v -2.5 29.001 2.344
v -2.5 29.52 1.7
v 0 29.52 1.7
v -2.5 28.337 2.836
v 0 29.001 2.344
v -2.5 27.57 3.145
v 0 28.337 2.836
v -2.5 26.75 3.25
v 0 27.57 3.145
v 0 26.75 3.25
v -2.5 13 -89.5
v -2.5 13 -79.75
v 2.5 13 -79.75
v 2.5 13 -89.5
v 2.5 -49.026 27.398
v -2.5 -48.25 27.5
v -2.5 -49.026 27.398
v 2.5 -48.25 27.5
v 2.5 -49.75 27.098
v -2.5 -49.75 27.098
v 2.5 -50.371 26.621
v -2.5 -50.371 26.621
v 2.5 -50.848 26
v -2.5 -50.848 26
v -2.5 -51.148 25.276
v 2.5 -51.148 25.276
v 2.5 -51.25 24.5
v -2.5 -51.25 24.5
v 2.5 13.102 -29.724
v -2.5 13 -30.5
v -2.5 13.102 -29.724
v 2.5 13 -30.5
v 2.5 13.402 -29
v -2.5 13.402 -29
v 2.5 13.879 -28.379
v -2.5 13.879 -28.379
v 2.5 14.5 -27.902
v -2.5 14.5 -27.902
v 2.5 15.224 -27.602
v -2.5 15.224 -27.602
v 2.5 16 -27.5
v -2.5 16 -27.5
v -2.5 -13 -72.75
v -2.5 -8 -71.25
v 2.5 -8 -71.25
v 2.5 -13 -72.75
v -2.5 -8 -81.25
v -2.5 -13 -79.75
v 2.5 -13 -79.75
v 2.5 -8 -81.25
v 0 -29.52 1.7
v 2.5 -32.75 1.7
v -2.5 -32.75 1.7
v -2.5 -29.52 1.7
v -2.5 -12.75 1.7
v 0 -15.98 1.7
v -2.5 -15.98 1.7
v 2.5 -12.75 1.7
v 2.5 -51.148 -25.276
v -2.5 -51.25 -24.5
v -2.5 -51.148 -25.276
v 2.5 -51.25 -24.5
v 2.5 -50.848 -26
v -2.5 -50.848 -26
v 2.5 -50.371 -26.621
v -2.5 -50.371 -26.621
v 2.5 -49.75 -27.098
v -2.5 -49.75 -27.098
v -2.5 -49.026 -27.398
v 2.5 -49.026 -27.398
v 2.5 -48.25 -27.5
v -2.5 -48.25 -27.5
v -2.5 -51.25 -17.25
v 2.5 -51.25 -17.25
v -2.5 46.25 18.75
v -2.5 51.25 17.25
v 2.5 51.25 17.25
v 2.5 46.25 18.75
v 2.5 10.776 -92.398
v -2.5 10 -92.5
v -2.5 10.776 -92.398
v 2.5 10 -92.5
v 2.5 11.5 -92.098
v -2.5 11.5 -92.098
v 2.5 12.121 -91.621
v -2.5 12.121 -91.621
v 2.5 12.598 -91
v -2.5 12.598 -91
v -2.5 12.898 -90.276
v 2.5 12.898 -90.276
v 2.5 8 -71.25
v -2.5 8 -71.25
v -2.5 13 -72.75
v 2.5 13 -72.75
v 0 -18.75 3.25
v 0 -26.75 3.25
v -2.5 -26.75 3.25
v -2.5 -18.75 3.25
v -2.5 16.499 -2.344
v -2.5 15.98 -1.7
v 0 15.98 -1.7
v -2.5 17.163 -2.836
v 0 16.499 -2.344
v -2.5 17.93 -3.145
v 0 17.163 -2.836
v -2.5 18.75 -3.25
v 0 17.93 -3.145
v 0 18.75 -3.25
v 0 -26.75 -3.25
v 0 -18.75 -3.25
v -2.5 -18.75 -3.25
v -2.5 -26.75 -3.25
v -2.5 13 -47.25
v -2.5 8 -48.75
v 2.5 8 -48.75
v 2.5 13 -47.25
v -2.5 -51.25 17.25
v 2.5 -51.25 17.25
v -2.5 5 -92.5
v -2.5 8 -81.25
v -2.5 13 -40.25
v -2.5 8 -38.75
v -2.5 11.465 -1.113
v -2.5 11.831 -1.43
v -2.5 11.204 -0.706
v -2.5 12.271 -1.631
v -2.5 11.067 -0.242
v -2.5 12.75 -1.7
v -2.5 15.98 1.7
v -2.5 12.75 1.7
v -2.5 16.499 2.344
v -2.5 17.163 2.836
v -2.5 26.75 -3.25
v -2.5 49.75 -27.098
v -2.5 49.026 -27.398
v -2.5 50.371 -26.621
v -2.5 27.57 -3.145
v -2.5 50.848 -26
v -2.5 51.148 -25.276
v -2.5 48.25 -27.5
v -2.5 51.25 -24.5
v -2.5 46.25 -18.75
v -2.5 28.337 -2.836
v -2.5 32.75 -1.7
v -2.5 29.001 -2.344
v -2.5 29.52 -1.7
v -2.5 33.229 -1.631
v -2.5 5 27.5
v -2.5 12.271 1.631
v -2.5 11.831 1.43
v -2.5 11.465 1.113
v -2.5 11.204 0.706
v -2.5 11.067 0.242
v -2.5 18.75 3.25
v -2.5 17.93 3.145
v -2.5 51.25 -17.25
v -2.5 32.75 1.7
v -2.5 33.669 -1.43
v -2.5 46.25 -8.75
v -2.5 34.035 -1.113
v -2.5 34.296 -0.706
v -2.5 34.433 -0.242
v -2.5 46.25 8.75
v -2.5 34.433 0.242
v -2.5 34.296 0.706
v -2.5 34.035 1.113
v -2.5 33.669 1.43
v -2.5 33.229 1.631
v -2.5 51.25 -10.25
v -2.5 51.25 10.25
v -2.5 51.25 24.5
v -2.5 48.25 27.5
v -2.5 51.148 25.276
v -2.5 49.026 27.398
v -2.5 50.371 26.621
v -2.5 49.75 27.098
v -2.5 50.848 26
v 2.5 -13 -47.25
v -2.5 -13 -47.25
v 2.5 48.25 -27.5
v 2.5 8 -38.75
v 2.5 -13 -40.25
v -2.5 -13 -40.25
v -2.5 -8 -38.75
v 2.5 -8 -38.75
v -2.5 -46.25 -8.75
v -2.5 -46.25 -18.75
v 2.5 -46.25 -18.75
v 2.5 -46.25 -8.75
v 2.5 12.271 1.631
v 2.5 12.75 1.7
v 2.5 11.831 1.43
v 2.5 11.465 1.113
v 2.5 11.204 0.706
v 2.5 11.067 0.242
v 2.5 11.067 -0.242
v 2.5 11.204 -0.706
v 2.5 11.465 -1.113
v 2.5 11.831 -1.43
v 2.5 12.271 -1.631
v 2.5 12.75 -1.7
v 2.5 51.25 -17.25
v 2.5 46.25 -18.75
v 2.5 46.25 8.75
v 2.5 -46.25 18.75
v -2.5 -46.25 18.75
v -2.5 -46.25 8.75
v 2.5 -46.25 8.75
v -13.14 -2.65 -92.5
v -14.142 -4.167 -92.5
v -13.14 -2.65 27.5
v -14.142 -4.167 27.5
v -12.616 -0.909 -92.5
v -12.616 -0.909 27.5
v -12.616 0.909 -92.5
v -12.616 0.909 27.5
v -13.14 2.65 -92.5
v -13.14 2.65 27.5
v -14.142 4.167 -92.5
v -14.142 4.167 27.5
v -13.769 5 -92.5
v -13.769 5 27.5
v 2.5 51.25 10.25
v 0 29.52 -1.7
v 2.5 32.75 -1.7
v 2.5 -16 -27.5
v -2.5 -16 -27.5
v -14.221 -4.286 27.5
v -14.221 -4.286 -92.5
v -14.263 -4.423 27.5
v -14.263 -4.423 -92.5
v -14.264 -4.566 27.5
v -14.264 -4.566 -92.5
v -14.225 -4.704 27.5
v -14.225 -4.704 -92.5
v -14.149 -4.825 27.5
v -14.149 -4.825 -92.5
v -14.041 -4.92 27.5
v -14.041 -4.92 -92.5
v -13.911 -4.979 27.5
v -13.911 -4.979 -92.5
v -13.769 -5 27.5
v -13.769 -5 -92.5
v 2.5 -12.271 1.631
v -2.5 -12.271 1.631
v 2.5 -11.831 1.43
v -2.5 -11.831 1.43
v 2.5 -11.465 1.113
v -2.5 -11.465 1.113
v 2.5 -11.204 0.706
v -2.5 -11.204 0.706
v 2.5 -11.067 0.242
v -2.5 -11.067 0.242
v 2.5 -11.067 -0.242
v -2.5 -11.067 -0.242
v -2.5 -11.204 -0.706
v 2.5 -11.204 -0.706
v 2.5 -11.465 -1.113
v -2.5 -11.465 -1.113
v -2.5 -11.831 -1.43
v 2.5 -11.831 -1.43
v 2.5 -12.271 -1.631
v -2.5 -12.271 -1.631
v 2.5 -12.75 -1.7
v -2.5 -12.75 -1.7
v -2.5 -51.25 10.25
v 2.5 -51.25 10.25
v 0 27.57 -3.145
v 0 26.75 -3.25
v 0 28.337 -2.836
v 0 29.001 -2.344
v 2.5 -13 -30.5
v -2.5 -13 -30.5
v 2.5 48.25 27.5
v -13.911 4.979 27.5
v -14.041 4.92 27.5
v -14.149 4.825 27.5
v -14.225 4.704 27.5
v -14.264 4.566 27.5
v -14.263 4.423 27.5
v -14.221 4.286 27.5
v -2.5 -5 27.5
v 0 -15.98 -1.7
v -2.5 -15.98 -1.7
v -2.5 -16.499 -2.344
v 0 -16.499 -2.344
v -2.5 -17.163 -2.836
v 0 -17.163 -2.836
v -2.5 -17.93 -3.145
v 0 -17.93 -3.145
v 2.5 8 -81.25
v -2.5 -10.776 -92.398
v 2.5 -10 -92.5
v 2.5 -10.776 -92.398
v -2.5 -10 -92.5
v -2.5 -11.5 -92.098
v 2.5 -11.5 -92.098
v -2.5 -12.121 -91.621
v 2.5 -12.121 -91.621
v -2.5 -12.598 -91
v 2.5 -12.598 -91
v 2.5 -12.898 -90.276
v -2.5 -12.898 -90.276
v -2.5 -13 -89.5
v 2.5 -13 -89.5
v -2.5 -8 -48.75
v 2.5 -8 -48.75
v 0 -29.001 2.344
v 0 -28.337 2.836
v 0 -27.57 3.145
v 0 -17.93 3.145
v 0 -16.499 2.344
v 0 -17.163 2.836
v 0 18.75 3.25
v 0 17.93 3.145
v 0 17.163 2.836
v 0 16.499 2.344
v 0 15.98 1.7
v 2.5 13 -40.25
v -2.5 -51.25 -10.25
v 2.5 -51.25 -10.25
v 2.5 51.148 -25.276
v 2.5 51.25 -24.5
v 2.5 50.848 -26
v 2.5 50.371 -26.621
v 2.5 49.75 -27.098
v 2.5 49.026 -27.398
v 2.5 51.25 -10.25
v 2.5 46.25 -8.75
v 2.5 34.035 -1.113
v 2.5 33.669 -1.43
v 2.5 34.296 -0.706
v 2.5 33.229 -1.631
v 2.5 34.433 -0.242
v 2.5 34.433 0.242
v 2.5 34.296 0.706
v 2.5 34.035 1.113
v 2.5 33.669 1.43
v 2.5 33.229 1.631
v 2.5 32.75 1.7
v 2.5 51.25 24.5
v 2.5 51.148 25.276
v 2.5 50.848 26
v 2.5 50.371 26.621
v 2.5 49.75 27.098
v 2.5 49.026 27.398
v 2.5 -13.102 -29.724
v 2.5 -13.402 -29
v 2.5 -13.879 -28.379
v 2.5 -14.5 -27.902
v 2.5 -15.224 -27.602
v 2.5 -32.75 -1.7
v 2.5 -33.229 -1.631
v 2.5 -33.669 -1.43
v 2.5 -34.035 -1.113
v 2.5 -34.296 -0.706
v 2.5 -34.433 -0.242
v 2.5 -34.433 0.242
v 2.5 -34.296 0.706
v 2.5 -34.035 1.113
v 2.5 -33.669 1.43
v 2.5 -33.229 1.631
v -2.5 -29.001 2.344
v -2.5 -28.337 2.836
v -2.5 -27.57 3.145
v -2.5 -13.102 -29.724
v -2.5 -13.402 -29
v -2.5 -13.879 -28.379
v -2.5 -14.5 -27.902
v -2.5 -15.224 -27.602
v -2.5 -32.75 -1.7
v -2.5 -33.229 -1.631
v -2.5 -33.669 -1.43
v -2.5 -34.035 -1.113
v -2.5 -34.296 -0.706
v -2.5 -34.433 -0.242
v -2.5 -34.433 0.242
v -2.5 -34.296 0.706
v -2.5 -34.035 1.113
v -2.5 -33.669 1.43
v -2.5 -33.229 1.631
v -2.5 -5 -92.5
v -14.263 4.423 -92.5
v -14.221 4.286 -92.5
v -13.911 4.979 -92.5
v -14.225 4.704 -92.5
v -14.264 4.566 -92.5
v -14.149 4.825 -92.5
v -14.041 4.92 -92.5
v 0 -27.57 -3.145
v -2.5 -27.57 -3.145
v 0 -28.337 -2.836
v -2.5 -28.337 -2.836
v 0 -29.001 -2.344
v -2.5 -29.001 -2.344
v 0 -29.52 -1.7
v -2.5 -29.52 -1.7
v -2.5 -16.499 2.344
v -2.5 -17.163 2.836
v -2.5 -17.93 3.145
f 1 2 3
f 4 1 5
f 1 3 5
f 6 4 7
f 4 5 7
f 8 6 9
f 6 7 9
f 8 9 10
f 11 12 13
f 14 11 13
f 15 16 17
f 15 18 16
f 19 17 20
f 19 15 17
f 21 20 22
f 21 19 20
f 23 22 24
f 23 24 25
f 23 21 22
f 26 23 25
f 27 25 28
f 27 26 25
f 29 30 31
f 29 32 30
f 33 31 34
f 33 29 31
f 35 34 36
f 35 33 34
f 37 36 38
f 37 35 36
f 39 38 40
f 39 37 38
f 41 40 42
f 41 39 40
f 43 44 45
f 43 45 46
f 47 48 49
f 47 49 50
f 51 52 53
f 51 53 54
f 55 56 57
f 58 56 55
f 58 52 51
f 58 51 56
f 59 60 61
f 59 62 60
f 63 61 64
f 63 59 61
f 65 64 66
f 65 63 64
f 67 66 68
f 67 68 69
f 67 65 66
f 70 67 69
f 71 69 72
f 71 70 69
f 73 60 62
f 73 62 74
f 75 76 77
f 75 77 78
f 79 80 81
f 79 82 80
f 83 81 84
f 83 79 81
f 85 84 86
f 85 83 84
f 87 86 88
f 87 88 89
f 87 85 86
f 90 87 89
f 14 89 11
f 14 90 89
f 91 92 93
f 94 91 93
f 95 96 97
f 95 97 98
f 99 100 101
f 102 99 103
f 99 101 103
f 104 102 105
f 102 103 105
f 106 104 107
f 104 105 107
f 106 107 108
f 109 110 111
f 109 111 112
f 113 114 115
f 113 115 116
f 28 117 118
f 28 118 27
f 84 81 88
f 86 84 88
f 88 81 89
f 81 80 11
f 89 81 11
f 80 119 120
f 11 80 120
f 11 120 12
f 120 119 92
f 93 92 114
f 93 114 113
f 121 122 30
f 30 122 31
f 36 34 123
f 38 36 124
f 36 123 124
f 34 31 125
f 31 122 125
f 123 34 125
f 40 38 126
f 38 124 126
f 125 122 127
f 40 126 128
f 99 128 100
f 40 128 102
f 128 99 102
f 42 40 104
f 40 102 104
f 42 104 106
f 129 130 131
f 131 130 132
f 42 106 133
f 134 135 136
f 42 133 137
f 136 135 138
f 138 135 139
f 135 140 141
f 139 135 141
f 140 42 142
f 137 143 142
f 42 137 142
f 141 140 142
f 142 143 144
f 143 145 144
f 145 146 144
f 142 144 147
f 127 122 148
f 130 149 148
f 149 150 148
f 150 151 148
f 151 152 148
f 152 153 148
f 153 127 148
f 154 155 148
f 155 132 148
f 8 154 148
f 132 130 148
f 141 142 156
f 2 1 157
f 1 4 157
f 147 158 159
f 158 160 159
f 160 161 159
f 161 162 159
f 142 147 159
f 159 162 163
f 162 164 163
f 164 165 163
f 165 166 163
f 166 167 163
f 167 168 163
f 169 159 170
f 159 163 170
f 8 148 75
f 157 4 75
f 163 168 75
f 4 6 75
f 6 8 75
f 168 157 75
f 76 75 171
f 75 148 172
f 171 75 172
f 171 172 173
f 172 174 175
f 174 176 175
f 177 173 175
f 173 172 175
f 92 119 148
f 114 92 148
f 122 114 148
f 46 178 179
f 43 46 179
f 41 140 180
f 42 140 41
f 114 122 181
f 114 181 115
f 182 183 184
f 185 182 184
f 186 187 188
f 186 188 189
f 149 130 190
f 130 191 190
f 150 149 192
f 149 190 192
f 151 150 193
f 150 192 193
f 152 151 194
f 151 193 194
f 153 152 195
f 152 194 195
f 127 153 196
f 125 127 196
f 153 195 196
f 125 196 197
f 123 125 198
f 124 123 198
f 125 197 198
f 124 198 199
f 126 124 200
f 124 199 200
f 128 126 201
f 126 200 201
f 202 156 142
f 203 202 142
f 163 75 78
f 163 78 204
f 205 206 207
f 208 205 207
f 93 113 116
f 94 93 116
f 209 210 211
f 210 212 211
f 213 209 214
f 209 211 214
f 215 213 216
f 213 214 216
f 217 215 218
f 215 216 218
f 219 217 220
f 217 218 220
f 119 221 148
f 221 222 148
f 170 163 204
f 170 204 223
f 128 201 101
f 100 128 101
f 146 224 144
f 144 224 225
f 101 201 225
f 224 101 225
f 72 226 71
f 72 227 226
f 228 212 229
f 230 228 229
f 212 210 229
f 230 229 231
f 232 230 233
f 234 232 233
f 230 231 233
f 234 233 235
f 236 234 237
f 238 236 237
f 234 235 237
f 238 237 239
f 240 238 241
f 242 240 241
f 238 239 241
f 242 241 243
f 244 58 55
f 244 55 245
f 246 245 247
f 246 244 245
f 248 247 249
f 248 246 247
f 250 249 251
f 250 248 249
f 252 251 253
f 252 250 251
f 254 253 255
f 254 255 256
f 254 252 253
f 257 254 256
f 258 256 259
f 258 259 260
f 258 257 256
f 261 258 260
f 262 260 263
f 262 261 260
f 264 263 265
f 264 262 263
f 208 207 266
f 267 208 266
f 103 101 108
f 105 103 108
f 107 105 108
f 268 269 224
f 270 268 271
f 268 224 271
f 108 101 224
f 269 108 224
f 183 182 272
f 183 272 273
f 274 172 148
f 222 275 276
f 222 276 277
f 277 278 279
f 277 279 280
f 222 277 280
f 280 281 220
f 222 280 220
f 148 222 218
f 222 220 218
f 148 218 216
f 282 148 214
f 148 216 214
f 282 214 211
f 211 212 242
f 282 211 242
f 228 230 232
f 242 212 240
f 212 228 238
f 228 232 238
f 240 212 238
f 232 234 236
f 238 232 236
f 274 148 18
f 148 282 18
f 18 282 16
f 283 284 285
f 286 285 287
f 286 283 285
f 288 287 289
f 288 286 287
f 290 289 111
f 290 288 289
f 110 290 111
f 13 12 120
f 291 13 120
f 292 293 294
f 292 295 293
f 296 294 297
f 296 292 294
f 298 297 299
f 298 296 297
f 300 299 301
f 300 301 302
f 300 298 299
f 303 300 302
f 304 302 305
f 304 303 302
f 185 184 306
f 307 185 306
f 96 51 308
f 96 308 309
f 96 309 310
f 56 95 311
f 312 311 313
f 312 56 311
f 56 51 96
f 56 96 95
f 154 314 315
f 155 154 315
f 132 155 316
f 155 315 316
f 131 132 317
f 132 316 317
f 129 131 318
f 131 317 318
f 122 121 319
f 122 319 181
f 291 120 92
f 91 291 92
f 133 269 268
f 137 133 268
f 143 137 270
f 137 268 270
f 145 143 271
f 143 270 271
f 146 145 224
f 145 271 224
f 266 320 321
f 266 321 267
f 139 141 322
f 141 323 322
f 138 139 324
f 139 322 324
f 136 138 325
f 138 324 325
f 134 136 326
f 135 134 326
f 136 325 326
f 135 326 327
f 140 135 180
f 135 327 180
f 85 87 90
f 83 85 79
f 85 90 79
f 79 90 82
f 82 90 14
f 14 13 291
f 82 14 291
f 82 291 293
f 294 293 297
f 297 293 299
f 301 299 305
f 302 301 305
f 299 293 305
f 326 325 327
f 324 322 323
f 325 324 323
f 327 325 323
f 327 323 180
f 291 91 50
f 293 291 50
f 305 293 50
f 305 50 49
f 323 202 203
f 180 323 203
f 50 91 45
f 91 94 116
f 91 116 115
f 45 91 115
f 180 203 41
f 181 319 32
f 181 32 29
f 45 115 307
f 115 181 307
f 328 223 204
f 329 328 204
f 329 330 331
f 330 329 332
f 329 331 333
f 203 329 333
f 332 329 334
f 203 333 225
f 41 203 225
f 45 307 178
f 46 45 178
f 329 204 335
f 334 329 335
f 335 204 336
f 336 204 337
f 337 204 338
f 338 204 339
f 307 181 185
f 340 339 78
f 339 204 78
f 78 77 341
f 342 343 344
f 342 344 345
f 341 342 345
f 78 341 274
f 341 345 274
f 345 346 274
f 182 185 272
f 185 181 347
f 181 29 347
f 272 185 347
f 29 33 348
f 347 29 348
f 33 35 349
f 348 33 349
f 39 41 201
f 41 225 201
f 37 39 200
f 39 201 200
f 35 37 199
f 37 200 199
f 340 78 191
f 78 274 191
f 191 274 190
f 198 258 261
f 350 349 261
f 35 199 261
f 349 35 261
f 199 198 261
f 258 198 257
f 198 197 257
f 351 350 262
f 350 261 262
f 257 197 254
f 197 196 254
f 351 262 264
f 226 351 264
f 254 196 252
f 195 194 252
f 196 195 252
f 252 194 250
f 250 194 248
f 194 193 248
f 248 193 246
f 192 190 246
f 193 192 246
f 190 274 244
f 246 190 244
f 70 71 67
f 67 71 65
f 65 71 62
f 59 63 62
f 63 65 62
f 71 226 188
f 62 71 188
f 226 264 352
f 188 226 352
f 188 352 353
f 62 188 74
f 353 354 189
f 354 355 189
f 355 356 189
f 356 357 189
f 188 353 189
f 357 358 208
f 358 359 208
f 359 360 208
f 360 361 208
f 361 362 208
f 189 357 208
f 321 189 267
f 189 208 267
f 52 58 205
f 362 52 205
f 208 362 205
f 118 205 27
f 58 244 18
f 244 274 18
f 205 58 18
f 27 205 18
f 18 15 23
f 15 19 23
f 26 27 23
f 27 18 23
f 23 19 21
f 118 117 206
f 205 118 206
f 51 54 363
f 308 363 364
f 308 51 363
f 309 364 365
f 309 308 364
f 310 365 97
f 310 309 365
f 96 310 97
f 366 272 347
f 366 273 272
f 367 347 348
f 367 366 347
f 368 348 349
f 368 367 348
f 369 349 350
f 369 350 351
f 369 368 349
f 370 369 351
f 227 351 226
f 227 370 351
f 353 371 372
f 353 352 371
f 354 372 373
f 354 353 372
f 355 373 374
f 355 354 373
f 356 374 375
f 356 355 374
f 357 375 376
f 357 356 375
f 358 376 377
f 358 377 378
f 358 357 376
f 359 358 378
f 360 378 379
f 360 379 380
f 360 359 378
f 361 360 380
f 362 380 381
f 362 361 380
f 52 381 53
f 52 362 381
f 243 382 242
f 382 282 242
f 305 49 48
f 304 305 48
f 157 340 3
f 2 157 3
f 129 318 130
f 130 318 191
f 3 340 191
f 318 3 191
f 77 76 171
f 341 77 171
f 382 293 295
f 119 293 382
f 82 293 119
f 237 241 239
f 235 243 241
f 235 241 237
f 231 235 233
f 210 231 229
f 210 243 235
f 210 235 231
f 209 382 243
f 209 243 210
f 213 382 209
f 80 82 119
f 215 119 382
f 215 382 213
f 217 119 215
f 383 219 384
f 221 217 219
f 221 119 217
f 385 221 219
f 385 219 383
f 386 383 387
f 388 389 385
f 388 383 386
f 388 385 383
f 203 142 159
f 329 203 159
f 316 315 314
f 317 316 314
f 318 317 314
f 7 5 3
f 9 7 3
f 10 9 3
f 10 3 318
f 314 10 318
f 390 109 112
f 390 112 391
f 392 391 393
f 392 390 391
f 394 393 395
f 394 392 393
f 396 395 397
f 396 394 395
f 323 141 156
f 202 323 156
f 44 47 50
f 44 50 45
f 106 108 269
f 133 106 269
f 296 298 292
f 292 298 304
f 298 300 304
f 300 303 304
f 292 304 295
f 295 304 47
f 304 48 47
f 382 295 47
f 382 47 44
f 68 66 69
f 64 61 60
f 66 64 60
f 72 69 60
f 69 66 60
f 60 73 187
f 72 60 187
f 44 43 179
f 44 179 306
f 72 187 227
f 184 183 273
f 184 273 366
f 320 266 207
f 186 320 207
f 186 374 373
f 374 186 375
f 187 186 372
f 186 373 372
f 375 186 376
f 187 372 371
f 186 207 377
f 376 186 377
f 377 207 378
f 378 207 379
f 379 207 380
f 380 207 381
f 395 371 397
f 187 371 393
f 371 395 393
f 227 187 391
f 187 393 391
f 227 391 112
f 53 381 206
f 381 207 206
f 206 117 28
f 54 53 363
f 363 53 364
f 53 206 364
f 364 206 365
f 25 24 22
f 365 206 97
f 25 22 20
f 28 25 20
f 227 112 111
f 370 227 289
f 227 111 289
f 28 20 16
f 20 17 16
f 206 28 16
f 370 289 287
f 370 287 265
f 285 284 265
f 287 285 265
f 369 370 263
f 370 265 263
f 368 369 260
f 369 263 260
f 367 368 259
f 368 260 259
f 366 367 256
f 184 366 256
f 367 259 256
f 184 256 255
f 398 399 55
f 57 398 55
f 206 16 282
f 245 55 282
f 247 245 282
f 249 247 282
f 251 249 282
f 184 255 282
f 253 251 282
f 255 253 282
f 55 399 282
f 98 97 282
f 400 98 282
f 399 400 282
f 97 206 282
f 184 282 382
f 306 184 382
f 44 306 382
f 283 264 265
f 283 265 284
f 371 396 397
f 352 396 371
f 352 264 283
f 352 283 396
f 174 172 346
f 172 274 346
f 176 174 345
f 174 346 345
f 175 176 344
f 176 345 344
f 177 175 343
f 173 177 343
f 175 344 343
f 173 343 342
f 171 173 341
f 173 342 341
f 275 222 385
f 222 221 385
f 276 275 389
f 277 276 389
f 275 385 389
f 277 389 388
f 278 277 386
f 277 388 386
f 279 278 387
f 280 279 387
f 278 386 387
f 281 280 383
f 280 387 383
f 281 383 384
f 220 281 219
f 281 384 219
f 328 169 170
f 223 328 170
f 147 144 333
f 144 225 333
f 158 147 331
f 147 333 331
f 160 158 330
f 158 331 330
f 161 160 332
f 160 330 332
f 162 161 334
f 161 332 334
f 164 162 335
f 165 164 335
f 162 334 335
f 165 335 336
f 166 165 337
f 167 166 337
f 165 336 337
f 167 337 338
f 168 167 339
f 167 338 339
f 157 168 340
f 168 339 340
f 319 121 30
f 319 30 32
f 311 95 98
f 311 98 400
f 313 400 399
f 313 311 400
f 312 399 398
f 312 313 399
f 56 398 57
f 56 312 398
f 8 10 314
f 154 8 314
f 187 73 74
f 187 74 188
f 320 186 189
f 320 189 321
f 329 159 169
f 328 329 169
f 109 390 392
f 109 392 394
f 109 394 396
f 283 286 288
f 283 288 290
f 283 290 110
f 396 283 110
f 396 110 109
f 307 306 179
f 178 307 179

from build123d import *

# Parameters (mm, degrees)
SKETCH1_W           = 55
SKETCH1_H           = 78.5
BOSS_EXTRUDE1_DEPTH = 2.5
SKETCH6_W           = 55
SKETCH6_H           = 10
BOSS_EXTRUDE2_DEPTH = 16.3
CUT_EXTRUDE1_DEPTH  = 71.135600803
SKETCH9_W           = 55
SKETCH9_H           = 12
BOSS_EXTRUDE3_DEPTH = 5
CUT_EXTRUDE4_DEPTH  = 5
CUT_EXTRUDE2_DEPTH  = 2.5
BOSS_EXTRUDE4_DEPTH = 65
FILLET1_R           = 0.5
CUT_EXTRUDE3_DEPTH  = 5
FILLET2_R           = 3


with BuildPart() as part:
    # Sketch1 → Boss-Extrude1 (new, symmetric)
    with BuildSketch(Plane(origin=(0, 0, 0), x_dir=(0, 0, -1), z_dir=(1, 0, 0))):
        Rectangle(SKETCH1_W, SKETCH1_H)
        with BuildLine():
            Line((-1.7, -32.75), (-1.7, -12.75))
            ThreePointArc((-1.7, -12.75), (0, -11.05), (1.7, -12.75))
            Line((1.7, -12.75), (1.7, -32.75))
            ThreePointArc((1.7, -32.75), (0, -34.45), (-1.7, -32.75))
        make_face(mode=Mode.SUBTRACT)
        with BuildLine():
            Line((-1.7, 32.75), (-1.7, 12.75))
            ThreePointArc((-1.7, 12.75), (0, 11.05), (1.7, 12.75))
            Line((1.7, 12.75), (1.7, 32.75))
            ThreePointArc((1.7, 32.75), (0, 34.45), (-1.7, 32.75))
        make_face(mode=Mode.SUBTRACT)
    extrude(amount=BOSS_EXTRUDE1_DEPTH, both=True)

    # Sketch6 → Boss-Extrude2 (add)
    with BuildSketch(Plane.ZY.offset(2.5)):
        Rectangle(SKETCH6_W, SKETCH6_H)
    extrude(amount=BOSS_EXTRUDE2_DEPTH)

    # Sketch7 → Cut-Extrude1 (cut, through all)
    with BuildSketch(Plane.XY.offset(27.5)):
        with BuildLine():
            Line((-15.05, 5), (-18.8, 5))
            Line((-18.8, 5), (-18.8, -5))
            Line((-18.8, -5), (-15.05, -5))
            ThreePointArc((-15.05, -5), (-12.55, 0), (-15.05, 5))
        make_face()
    extrude(amount=-CUT_EXTRUDE1_DEPTH, mode=Mode.SUBTRACT)

    # Sketch9 → Boss-Extrude3 (add)
    with BuildSketch(Plane.ZY.offset(2.5)):
        with Locations((0, 45.25)):
            Rectangle(SKETCH9_W, SKETCH9_H)
    boss_extrude3 = extrude(amount=-BOSS_EXTRUDE3_DEPTH)

    # Sketch16 → Cut-Extrude4 (cut)
    with BuildSketch(Plane.ZY.offset(2.5)):
        Polygon((10.25, 51.25), (17.25, 51.25), (18.75, 46.25), (8.75, 46.25), align=None)
        Polygon((-18.75, 46.25), (-8.75, 46.25), (-10.25, 51.25), (-17.25, 51.25), align=None)
    cut_extrude4 = extrude(amount=-CUT_EXTRUDE4_DEPTH, mode=Mode.SUBTRACT)

    # Mirror1: Boss-Extrude3 across plane
    add(boss_extrude3.mirror(Plane.ZX))

    # Sketch10 → Cut-Extrude2 (cut)
    with BuildSketch(Plane(origin=(0, 0, 0), x_dir=(0, 0, -1), z_dir=(1, 0, 0))):
        with BuildLine():
            Line((3.25, -18.75), (3.25, -26.75))
            ThreePointArc((3.25, -26.75), (0, -30), (-3.25, -26.75))
            Line((-3.25, -26.75), (-3.25, -18.75))
            ThreePointArc((-3.25, -18.75), (0, -15.5), (3.25, -18.75))
        make_face()
        with BuildLine():
            Line((3.25, 18.75), (3.25, 26.75))
            ThreePointArc((3.25, 26.75), (0, 30), (-3.25, 26.75))
            Line((-3.25, 26.75), (-3.25, 18.75))
            ThreePointArc((-3.25, 18.75), (0, 15.5), (3.25, 18.75))
        make_face()
    extrude(amount=-CUT_EXTRUDE2_DEPTH, mode=Mode.SUBTRACT)

    # Sketch11 → Boss-Extrude4 (add)
    with BuildSketch(Plane(origin=(0, 0, -27.5), x_dir=(-1, 0, 0), z_dir=(0, 0, -1))):
        with BuildLine():
            Line((-2.5, -13), (2.5, -13))
            Line((2.5, -13), (2.5, -5))
            Line((2.5, -5), (15.05, -5))
            ThreePointArc((15.05, -5), (12.55, 0), (15.05, 5))
            Line((15.05, 5), (2.5, 5))
            Line((2.5, 5), (2.5, 13))
            Line((2.5, 13), (-2.5, 13))
            Line((-2.5, 13), (-2.5, -13))
        make_face()
    extrude(amount=BOSS_EXTRUDE4_DEPTH)

    # Fillet1
    fillet1_edges = [part.edges().sort_by_distance(p)[0] for p in [
        (-15.05, 5, -32.5),
        (-15.05, -5, -32.5),
    ]]
    fillet(fillet1_edges, radius=FILLET1_R)

    # Sketch15 → Cut-Extrude3 (cut)
    with BuildSketch(Plane.ZY.offset(2.5)):
        Polygon((-40.25, 13), (-38.75, 8), (-48.75, 8), (-47.25, 13), align=None)
        Polygon((-72.75, 13), (-79.75, 13), (-81.25, 8), (-71.25, 8), align=None)
    cut_extrude3 = extrude(amount=-CUT_EXTRUDE3_DEPTH, mode=Mode.SUBTRACT)

    # Mirror2: Cut-Extrude3 across plane
    add(cut_extrude3.mirror(Plane.ZX), mode=Mode.SUBTRACT)

    # Mirror3: Cut-Extrude4 across plane
    add(cut_extrude4.mirror(Plane.ZX), mode=Mode.SUBTRACT)

    # Fillet2
    fillet2_edges = [part.edges().sort_by_distance(p)[0] for p in [
        (0, -51.25, 27.5),
        (0, -51.25, -27.5),
        (0, 13, -27.5),
        (0, -13, -27.5),
        (0, 13, -92.5),
        (0, -13, -92.5),
        (0, 51.25, -27.5),
        (0, 51.25, 27.5),
    ]]
    fillet(fillet2_edges, radius=FILLET2_R)


solid = part.part
